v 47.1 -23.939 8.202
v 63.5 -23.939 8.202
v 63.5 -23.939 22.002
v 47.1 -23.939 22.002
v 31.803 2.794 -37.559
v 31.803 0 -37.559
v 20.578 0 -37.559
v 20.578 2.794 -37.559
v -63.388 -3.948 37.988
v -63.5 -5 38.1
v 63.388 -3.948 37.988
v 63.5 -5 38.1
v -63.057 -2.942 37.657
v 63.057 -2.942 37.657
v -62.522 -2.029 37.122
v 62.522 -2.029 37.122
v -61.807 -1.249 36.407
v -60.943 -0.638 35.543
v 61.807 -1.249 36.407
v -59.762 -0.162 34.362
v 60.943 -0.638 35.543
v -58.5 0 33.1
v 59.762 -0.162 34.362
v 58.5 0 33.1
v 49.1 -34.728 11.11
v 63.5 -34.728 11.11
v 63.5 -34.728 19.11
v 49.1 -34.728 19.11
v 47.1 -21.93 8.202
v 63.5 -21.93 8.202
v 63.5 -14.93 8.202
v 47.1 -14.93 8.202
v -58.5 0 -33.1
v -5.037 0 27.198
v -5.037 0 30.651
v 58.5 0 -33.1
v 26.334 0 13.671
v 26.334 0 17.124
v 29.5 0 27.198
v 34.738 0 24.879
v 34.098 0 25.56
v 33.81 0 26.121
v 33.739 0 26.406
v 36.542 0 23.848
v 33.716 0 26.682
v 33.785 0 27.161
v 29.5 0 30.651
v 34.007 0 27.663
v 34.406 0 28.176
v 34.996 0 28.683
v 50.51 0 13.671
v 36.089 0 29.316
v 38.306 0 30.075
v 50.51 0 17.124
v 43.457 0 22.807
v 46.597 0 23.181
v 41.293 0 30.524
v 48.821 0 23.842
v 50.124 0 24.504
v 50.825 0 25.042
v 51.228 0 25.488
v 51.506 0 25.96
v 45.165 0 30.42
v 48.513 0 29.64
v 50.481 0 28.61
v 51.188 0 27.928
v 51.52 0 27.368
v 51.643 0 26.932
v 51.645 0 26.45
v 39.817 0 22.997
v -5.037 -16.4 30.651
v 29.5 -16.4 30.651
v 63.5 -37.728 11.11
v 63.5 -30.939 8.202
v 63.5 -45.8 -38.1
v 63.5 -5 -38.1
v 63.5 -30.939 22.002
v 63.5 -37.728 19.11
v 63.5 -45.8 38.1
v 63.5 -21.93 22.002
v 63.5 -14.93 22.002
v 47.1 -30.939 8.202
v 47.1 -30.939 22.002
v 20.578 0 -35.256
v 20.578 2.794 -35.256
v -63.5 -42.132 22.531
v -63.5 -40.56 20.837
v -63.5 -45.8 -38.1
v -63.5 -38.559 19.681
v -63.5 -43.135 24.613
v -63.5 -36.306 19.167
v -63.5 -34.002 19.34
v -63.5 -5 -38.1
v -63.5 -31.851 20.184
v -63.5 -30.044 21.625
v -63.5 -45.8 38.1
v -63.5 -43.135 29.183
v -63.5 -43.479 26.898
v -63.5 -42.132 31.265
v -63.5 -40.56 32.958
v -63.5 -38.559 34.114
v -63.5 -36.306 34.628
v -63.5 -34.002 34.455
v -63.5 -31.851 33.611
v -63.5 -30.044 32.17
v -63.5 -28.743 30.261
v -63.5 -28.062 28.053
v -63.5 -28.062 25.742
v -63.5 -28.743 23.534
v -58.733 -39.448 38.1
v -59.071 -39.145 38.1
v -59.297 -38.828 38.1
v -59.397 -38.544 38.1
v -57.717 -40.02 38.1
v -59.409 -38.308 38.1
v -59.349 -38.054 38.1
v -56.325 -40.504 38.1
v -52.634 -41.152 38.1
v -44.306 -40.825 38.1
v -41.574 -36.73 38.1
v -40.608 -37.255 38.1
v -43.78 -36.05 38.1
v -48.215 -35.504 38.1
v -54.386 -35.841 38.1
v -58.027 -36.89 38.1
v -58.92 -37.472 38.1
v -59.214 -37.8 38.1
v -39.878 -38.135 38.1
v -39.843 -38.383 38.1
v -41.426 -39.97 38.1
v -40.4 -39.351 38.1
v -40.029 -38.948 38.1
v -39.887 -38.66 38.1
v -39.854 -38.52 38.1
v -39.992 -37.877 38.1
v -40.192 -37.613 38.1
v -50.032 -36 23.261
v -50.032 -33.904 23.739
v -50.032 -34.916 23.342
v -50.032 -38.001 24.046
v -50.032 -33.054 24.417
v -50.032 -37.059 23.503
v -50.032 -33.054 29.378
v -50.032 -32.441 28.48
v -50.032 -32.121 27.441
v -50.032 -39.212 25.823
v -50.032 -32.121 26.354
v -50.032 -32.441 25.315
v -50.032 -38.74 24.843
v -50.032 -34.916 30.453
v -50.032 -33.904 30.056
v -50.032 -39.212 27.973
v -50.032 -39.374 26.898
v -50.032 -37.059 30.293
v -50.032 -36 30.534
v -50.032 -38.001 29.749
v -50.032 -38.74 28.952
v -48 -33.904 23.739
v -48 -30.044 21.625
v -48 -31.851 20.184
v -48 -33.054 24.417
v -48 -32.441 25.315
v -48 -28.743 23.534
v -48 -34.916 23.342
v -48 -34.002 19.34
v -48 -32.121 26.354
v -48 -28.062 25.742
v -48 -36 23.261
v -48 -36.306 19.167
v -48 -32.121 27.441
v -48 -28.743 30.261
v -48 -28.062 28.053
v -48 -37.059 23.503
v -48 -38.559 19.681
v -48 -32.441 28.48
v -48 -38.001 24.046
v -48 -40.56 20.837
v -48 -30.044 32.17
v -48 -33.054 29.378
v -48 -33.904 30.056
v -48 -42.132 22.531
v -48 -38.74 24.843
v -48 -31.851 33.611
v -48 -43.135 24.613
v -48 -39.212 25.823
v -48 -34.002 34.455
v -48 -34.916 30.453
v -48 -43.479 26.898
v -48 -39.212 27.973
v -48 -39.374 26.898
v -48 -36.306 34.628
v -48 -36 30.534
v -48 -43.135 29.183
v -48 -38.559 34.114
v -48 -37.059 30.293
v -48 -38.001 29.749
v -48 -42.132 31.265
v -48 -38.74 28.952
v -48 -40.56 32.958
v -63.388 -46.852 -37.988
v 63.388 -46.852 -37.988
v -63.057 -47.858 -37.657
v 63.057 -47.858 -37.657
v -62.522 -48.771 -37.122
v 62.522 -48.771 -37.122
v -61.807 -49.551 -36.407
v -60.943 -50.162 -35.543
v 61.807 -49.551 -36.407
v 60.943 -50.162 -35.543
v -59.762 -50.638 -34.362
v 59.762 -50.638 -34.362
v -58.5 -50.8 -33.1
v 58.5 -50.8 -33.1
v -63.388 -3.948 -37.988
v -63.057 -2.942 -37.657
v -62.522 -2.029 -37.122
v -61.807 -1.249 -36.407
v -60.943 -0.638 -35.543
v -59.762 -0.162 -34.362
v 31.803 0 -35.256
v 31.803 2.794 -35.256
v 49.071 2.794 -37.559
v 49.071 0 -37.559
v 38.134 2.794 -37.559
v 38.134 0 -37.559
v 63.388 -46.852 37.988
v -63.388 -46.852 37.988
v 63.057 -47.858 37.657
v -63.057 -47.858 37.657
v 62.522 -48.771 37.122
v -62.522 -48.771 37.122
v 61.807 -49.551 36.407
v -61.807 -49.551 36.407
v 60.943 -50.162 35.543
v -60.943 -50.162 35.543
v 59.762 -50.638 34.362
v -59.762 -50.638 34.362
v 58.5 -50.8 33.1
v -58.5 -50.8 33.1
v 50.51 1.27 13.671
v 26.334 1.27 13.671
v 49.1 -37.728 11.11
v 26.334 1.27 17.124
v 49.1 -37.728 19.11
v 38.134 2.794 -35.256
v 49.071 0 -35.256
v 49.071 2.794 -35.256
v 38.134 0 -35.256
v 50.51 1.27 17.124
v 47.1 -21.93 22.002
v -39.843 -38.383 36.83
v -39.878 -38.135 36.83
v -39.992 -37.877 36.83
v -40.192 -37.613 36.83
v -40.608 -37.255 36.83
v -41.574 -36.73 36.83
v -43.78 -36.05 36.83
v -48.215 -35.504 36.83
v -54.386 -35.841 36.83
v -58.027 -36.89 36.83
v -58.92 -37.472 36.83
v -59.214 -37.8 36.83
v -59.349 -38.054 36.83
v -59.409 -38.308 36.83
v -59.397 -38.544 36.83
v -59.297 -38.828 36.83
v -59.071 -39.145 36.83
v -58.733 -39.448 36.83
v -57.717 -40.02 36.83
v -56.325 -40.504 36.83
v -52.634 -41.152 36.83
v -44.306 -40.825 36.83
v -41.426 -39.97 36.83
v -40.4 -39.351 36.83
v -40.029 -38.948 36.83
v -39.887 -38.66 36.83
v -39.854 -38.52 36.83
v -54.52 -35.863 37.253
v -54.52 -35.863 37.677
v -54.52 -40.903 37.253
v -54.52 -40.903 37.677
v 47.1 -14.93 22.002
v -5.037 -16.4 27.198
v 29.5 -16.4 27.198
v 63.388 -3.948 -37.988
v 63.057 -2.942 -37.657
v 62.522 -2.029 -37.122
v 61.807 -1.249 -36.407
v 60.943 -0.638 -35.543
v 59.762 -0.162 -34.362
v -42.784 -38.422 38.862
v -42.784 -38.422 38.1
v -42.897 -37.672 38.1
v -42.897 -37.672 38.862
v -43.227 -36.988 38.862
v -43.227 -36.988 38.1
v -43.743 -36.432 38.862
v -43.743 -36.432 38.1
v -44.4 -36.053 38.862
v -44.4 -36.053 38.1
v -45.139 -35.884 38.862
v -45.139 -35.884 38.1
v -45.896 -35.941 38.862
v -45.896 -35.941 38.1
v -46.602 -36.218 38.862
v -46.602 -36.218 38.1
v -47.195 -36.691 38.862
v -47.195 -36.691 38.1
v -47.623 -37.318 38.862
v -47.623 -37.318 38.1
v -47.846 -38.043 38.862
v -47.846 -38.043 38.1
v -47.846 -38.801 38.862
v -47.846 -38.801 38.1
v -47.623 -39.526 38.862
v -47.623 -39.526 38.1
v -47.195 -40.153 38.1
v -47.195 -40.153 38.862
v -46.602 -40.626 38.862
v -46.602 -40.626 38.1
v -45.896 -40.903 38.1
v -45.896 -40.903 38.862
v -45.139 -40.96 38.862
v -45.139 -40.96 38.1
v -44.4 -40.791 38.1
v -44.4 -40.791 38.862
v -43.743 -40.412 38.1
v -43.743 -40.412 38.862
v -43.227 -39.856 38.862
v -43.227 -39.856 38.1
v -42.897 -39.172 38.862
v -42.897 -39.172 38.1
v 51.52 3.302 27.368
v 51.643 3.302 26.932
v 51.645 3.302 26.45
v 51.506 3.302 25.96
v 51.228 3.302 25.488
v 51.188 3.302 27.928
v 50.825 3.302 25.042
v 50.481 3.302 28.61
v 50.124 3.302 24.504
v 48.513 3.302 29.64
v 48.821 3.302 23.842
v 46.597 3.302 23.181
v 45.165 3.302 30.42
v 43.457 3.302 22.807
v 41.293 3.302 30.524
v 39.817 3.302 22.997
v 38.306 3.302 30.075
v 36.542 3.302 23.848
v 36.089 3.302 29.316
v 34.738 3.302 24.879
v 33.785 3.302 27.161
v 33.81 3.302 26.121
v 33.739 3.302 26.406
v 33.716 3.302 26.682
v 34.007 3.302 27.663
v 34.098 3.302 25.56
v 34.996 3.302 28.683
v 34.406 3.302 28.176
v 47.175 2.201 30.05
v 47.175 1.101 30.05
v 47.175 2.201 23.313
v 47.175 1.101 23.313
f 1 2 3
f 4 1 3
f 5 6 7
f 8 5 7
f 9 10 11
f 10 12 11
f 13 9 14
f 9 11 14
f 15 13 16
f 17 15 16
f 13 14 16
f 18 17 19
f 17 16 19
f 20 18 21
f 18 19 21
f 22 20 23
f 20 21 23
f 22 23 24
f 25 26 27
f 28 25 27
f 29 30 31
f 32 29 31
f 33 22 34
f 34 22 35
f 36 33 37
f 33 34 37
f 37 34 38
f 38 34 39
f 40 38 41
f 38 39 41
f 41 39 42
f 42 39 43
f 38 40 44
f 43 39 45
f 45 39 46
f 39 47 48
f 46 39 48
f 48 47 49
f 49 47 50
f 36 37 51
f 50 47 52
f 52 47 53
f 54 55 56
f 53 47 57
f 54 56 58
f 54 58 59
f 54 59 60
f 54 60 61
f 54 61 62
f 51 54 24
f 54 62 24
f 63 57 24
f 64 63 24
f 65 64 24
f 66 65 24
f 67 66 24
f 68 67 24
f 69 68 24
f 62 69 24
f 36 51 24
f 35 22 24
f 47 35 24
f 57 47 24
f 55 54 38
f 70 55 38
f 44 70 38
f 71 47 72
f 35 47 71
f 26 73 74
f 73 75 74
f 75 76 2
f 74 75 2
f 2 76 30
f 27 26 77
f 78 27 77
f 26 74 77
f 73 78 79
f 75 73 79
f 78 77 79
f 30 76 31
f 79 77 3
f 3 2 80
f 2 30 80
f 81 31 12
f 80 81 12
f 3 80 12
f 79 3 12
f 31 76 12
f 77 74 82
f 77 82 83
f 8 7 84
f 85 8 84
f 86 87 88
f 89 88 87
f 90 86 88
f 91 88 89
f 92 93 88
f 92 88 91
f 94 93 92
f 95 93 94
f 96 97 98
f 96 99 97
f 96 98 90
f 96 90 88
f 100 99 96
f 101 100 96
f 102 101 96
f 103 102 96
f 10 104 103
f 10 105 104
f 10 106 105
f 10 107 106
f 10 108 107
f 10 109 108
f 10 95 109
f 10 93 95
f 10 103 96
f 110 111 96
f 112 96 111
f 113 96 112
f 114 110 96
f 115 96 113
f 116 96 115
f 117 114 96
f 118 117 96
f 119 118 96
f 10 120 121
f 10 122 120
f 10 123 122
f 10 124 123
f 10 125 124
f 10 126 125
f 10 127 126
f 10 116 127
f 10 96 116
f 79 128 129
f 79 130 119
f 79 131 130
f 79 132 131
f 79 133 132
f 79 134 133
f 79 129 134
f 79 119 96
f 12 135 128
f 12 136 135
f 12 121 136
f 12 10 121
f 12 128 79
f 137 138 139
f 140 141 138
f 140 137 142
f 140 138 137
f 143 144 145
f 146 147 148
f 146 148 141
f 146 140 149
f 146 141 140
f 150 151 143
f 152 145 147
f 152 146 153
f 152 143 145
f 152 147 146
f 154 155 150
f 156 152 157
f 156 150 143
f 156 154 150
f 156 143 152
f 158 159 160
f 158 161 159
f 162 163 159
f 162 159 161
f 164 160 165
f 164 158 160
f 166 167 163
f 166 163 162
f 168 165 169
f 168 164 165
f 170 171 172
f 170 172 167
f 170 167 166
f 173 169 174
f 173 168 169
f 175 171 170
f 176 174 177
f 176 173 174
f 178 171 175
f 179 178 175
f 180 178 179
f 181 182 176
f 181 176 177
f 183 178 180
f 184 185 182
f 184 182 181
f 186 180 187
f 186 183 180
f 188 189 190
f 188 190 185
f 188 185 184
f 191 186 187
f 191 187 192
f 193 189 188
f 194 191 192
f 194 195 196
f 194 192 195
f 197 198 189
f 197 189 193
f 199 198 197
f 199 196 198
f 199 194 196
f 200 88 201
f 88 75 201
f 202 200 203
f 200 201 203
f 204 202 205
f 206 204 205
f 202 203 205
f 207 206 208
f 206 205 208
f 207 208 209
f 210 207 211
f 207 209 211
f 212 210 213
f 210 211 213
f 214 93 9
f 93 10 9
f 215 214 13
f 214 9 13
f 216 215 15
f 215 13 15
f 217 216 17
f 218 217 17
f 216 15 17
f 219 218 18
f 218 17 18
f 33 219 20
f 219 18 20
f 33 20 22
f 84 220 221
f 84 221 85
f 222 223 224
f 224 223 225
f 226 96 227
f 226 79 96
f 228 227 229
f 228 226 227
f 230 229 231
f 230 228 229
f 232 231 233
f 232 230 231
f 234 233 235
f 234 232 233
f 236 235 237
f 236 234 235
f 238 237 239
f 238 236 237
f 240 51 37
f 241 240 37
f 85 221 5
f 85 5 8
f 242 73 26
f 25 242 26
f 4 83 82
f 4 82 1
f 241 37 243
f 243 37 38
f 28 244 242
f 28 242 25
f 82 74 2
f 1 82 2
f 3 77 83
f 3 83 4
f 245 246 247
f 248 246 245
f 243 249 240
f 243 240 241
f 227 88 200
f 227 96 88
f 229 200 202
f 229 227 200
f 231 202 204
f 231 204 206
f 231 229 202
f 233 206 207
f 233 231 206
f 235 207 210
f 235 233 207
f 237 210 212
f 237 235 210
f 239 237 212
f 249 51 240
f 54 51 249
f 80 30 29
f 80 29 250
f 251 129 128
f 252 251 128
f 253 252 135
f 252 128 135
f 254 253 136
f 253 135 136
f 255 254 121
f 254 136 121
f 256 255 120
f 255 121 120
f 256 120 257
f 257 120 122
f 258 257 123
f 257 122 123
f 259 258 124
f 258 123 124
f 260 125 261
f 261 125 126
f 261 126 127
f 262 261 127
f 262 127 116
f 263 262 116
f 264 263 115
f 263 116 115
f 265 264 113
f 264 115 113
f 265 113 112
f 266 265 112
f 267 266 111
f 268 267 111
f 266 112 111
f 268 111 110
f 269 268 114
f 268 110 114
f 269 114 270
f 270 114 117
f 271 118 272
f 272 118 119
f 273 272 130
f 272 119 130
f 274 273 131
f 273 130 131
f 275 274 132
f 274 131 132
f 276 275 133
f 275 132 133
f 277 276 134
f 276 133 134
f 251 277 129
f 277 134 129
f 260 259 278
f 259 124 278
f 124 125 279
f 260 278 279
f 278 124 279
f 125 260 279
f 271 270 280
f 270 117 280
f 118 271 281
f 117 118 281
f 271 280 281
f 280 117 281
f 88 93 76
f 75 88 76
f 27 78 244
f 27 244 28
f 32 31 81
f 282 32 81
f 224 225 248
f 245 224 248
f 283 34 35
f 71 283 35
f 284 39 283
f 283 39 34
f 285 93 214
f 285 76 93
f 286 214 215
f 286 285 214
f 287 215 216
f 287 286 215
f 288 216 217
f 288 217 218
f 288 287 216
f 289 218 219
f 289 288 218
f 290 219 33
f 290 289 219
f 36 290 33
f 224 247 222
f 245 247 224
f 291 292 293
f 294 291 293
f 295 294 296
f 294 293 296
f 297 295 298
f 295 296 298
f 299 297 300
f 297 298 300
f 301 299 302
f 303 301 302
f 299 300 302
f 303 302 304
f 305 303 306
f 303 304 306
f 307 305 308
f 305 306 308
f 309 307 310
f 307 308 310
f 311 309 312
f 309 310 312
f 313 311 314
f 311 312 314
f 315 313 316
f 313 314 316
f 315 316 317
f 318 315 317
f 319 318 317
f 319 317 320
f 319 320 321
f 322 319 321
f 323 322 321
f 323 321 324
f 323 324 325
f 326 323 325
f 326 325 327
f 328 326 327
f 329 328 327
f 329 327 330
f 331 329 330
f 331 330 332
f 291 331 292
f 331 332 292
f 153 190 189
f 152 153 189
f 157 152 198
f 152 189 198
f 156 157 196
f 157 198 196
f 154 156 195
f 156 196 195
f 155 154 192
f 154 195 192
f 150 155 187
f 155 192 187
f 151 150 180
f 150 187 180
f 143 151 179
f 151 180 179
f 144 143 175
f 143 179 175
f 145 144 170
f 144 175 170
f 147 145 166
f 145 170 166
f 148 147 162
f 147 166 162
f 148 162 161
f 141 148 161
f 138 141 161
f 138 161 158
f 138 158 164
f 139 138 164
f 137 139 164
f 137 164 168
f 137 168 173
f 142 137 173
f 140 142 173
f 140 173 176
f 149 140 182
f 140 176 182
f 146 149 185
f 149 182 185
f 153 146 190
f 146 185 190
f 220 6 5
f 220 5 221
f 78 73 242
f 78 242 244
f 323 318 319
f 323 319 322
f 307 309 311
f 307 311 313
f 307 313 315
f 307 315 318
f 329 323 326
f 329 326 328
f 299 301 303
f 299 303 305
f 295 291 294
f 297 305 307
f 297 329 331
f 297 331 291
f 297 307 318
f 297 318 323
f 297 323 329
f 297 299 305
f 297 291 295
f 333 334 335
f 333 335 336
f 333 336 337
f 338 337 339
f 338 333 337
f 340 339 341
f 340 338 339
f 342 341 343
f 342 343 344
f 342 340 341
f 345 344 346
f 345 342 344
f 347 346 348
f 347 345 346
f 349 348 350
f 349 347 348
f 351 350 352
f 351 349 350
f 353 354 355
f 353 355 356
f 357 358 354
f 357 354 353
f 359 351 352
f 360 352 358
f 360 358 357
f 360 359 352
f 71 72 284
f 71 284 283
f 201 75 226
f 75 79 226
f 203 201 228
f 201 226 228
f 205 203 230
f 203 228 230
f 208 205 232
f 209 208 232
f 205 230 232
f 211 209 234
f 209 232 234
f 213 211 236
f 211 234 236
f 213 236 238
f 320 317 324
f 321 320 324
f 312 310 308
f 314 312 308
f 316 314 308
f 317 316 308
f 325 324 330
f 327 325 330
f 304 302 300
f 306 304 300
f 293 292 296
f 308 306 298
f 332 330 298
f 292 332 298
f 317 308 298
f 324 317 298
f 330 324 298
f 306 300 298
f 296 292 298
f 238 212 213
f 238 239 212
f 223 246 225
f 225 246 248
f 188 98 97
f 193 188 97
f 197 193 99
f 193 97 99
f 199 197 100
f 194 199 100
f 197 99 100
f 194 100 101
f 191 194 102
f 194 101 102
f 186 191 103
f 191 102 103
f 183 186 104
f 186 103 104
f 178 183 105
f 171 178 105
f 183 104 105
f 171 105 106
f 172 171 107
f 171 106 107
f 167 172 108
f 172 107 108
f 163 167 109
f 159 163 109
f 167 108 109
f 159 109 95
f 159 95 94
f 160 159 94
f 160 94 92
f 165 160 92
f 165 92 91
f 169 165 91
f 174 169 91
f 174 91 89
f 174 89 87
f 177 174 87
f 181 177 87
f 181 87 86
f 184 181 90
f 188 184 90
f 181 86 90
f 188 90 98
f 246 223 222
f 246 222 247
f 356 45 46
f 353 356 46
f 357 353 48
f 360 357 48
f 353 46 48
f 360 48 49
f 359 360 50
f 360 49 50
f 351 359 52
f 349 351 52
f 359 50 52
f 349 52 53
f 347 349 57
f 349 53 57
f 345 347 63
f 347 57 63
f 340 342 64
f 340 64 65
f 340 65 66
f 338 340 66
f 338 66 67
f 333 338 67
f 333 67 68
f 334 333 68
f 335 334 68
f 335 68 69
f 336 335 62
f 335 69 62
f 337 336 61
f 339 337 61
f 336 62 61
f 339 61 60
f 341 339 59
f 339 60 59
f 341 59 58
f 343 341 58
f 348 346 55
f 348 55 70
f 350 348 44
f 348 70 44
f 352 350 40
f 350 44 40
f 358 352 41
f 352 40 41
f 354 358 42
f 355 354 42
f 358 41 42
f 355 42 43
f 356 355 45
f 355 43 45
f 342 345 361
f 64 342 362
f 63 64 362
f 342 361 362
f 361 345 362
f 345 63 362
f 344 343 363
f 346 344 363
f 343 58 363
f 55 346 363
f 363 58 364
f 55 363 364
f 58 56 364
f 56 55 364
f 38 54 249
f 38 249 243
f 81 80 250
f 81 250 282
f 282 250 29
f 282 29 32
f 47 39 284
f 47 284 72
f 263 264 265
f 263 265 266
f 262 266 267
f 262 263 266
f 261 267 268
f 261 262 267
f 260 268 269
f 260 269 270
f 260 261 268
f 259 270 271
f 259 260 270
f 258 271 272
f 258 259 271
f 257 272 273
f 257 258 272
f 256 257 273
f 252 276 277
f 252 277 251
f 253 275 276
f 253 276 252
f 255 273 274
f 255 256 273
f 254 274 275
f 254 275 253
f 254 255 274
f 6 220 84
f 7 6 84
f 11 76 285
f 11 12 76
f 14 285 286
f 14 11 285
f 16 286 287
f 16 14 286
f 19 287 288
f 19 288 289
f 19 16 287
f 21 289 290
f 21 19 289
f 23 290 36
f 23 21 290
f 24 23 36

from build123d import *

# Parameters (mm, degrees)
F0_W      = 127
F0_H      = 76.2
F1_DEPTH  = 50.8
F2_R      = 5
F3_W      = 7
F3_H      = 13.8
F4_DEPTH  = 16.4
F5_W      = 7
F5_H      = 13.8
F6_DEPTH  = 16.4
F7_W      = 3
F7_H      = 8
F8_DEPTH  = 14.4
F9_R      = 7.752085
F10_DEPTH = 15.5
F11_R     = 3.646977
F12_DEPTH = 2.032
F14_DEPTH = 1.27
F15_R     = 2.545148
F16_DEPTH = 0.762
F18_DEPTH = 3.302
F19_W     = 34.536691
F19_H     = 3.45367
F20_DEPTH = 16.4
F21_W     = 10.936618
F21_H     = 2.302445
F21_W_2   = 11.224423
F22_DEPTH = 2.794
F23_W     = 24.175685
F23_H     = 3.453668
F24_DEPTH = 1.27


with BuildPart() as f1:
    # F0 (on Front) → F1 (new body)
    with BuildSketch(Plane.XZ):
        Rectangle(F0_W, F0_H)
    extrude(amount=F1_DEPTH)

    # F2
    f2_edges = [f1.edges().sort_by_distance(p)[0] for p in [
        (0, -50.8, -38.1),
        (0, 0, -38.1),
        (63.5, 0, 0),
        (0, 0, 38.1),
        (-63.5, 0, 0),
        (0, -50.8, 38.1),
        (63.5, -50.8, 0),
        (-63.5, -50.8, 0),
    ]]
    fillet(f2_edges, radius=F2_R)

    # F3 (on face) → F4 (cut)
    with BuildSketch(Plane.YZ.offset(63.5)):
        with Locations((-27.439119, 15.102464)):
            Rectangle(F3_W, F3_H)
    extrude(amount=-F4_DEPTH, mode=Mode.SUBTRACT)

    # F5 (on face) → F6 (cut)
    with BuildSketch(Plane.YZ.offset(63.5)):
        with Locations((-18.430447, 15.102464)):
            Rectangle(F5_W, F5_H)
    extrude(amount=-F6_DEPTH, mode=Mode.SUBTRACT)

    # F7 (on face) → F8 (cut)
    with BuildSketch(Plane.YZ.offset(63.5)):
        with Locations((-36.227684, 15.109803)):
            Rectangle(F7_W, F7_H)
    extrude(amount=-F8_DEPTH, mode=Mode.SUBTRACT)

    # F9 (on face) → F10 (cut)
    with BuildSketch(Plane(origin=(-63.5, 0, 0), x_dir=(0, -1, 0), z_dir=(-1, 0, 0))):
        with Locations((35.727076, 26.897665)):
            Circle(F9_R)
    extrude(amount=-F10_DEPTH, mode=Mode.SUBTRACT)

    # F11 (on face) → F12 (join)
    with BuildSketch(Plane(origin=(-48, 0, 0), x_dir=(0, -1, 0), z_dir=(-1, 0, 0))):
        with Locations((35.727076, 26.897665)):
            Circle(F11_R)
    extrude(amount=F12_DEPTH)

    # F13 (on face) → F14 (cut)
    with BuildSketch(Plane.XY.offset(38.1)):
        with BuildLine():
            add(Edge.make_bspline(
                [(-39.842725, -38.383145), (-39.842725, -33.343195), (-54.51994, -35.86317), (-69.197156, -38.383145), (-54.51994, -40.90312), (-39.842725, -43.423094), (-39.842725, -38.383145)],
                knots=[0, 0, 0, 2.094395, 2.094395, 4.18879, 4.18879, 6.283185, 6.283185, 6.283185], degree=2, weights=[1, 0.5, 1, 0.5, 1, 0.5, 1]))
        make_face()
    extrude(amount=-F14_DEPTH, mode=Mode.SUBTRACT)

    # F17 (on face) → F18 (join)
    with BuildSketch(Plane(origin=(0, 0, 0), x_dir=(-1, 0, 0), z_dir=(0, 1, 0))):
        with BuildLine():
            add(Edge.make_bspline(
                [(-33.716403, 26.681565), (-33.716403, 33.418071), (-47.175102, 30.049818), (-60.633801, 26.681565), (-47.175102, 23.313312), (-33.716403, 19.945059), (-33.716403, 26.681565)],
                knots=[0, 0, 0, 2.094395, 2.094395, 4.18879, 4.18879, 6.283185, 6.283185, 6.283185], degree=2, weights=[1, 0.5, 1, 0.5, 1, 0.5, 1]))
        make_face()
    extrude(amount=F18_DEPTH)

    # F19 (on face) → F20 (cut)
    with BuildSketch(Plane(origin=(0, 0, 0), x_dir=(-1, 0, 0), z_dir=(0, 1, 0))):
        with Locations((-12.231744, 28.924479)):
            Rectangle(F19_W, F19_H)
    extrude(amount=-F20_DEPTH, mode=Mode.SUBTRACT)

    # F23 (on face) → F24 (join)
    with BuildSketch(Plane(origin=(0, 0, 0), x_dir=(-1, 0, 0), z_dir=(0, 1, 0))):
        with Locations((-38.422068, 15.397608)):
            Rectangle(F23_W, F23_H)
    extrude(amount=F24_DEPTH)


with BuildPart() as f16:
    # F15 (on face) → F16 (new body)
    with BuildSketch(Plane.XY.offset(38.1)):
        with Locations((-45.329407, -38.422067)):
            Circle(F15_R)
    extrude(amount=F16_DEPTH)


with BuildPart() as f22:
    # F21 (on face) → F22 (new body)
    with BuildSketch(Plane(origin=(0, 0, 0), x_dir=(-1, 0, 0), z_dir=(0, 1, 0))):
        with Locations((-43.602571, -36.407429)):
            Rectangle(F21_W, F21_H)
        with Locations((-26.190323, -36.407429)):
            Rectangle(F21_W_2, F21_H)
    extrude(amount=F22_DEPTH)


solid = Compound([f1.part, f16.part, f22.part])
